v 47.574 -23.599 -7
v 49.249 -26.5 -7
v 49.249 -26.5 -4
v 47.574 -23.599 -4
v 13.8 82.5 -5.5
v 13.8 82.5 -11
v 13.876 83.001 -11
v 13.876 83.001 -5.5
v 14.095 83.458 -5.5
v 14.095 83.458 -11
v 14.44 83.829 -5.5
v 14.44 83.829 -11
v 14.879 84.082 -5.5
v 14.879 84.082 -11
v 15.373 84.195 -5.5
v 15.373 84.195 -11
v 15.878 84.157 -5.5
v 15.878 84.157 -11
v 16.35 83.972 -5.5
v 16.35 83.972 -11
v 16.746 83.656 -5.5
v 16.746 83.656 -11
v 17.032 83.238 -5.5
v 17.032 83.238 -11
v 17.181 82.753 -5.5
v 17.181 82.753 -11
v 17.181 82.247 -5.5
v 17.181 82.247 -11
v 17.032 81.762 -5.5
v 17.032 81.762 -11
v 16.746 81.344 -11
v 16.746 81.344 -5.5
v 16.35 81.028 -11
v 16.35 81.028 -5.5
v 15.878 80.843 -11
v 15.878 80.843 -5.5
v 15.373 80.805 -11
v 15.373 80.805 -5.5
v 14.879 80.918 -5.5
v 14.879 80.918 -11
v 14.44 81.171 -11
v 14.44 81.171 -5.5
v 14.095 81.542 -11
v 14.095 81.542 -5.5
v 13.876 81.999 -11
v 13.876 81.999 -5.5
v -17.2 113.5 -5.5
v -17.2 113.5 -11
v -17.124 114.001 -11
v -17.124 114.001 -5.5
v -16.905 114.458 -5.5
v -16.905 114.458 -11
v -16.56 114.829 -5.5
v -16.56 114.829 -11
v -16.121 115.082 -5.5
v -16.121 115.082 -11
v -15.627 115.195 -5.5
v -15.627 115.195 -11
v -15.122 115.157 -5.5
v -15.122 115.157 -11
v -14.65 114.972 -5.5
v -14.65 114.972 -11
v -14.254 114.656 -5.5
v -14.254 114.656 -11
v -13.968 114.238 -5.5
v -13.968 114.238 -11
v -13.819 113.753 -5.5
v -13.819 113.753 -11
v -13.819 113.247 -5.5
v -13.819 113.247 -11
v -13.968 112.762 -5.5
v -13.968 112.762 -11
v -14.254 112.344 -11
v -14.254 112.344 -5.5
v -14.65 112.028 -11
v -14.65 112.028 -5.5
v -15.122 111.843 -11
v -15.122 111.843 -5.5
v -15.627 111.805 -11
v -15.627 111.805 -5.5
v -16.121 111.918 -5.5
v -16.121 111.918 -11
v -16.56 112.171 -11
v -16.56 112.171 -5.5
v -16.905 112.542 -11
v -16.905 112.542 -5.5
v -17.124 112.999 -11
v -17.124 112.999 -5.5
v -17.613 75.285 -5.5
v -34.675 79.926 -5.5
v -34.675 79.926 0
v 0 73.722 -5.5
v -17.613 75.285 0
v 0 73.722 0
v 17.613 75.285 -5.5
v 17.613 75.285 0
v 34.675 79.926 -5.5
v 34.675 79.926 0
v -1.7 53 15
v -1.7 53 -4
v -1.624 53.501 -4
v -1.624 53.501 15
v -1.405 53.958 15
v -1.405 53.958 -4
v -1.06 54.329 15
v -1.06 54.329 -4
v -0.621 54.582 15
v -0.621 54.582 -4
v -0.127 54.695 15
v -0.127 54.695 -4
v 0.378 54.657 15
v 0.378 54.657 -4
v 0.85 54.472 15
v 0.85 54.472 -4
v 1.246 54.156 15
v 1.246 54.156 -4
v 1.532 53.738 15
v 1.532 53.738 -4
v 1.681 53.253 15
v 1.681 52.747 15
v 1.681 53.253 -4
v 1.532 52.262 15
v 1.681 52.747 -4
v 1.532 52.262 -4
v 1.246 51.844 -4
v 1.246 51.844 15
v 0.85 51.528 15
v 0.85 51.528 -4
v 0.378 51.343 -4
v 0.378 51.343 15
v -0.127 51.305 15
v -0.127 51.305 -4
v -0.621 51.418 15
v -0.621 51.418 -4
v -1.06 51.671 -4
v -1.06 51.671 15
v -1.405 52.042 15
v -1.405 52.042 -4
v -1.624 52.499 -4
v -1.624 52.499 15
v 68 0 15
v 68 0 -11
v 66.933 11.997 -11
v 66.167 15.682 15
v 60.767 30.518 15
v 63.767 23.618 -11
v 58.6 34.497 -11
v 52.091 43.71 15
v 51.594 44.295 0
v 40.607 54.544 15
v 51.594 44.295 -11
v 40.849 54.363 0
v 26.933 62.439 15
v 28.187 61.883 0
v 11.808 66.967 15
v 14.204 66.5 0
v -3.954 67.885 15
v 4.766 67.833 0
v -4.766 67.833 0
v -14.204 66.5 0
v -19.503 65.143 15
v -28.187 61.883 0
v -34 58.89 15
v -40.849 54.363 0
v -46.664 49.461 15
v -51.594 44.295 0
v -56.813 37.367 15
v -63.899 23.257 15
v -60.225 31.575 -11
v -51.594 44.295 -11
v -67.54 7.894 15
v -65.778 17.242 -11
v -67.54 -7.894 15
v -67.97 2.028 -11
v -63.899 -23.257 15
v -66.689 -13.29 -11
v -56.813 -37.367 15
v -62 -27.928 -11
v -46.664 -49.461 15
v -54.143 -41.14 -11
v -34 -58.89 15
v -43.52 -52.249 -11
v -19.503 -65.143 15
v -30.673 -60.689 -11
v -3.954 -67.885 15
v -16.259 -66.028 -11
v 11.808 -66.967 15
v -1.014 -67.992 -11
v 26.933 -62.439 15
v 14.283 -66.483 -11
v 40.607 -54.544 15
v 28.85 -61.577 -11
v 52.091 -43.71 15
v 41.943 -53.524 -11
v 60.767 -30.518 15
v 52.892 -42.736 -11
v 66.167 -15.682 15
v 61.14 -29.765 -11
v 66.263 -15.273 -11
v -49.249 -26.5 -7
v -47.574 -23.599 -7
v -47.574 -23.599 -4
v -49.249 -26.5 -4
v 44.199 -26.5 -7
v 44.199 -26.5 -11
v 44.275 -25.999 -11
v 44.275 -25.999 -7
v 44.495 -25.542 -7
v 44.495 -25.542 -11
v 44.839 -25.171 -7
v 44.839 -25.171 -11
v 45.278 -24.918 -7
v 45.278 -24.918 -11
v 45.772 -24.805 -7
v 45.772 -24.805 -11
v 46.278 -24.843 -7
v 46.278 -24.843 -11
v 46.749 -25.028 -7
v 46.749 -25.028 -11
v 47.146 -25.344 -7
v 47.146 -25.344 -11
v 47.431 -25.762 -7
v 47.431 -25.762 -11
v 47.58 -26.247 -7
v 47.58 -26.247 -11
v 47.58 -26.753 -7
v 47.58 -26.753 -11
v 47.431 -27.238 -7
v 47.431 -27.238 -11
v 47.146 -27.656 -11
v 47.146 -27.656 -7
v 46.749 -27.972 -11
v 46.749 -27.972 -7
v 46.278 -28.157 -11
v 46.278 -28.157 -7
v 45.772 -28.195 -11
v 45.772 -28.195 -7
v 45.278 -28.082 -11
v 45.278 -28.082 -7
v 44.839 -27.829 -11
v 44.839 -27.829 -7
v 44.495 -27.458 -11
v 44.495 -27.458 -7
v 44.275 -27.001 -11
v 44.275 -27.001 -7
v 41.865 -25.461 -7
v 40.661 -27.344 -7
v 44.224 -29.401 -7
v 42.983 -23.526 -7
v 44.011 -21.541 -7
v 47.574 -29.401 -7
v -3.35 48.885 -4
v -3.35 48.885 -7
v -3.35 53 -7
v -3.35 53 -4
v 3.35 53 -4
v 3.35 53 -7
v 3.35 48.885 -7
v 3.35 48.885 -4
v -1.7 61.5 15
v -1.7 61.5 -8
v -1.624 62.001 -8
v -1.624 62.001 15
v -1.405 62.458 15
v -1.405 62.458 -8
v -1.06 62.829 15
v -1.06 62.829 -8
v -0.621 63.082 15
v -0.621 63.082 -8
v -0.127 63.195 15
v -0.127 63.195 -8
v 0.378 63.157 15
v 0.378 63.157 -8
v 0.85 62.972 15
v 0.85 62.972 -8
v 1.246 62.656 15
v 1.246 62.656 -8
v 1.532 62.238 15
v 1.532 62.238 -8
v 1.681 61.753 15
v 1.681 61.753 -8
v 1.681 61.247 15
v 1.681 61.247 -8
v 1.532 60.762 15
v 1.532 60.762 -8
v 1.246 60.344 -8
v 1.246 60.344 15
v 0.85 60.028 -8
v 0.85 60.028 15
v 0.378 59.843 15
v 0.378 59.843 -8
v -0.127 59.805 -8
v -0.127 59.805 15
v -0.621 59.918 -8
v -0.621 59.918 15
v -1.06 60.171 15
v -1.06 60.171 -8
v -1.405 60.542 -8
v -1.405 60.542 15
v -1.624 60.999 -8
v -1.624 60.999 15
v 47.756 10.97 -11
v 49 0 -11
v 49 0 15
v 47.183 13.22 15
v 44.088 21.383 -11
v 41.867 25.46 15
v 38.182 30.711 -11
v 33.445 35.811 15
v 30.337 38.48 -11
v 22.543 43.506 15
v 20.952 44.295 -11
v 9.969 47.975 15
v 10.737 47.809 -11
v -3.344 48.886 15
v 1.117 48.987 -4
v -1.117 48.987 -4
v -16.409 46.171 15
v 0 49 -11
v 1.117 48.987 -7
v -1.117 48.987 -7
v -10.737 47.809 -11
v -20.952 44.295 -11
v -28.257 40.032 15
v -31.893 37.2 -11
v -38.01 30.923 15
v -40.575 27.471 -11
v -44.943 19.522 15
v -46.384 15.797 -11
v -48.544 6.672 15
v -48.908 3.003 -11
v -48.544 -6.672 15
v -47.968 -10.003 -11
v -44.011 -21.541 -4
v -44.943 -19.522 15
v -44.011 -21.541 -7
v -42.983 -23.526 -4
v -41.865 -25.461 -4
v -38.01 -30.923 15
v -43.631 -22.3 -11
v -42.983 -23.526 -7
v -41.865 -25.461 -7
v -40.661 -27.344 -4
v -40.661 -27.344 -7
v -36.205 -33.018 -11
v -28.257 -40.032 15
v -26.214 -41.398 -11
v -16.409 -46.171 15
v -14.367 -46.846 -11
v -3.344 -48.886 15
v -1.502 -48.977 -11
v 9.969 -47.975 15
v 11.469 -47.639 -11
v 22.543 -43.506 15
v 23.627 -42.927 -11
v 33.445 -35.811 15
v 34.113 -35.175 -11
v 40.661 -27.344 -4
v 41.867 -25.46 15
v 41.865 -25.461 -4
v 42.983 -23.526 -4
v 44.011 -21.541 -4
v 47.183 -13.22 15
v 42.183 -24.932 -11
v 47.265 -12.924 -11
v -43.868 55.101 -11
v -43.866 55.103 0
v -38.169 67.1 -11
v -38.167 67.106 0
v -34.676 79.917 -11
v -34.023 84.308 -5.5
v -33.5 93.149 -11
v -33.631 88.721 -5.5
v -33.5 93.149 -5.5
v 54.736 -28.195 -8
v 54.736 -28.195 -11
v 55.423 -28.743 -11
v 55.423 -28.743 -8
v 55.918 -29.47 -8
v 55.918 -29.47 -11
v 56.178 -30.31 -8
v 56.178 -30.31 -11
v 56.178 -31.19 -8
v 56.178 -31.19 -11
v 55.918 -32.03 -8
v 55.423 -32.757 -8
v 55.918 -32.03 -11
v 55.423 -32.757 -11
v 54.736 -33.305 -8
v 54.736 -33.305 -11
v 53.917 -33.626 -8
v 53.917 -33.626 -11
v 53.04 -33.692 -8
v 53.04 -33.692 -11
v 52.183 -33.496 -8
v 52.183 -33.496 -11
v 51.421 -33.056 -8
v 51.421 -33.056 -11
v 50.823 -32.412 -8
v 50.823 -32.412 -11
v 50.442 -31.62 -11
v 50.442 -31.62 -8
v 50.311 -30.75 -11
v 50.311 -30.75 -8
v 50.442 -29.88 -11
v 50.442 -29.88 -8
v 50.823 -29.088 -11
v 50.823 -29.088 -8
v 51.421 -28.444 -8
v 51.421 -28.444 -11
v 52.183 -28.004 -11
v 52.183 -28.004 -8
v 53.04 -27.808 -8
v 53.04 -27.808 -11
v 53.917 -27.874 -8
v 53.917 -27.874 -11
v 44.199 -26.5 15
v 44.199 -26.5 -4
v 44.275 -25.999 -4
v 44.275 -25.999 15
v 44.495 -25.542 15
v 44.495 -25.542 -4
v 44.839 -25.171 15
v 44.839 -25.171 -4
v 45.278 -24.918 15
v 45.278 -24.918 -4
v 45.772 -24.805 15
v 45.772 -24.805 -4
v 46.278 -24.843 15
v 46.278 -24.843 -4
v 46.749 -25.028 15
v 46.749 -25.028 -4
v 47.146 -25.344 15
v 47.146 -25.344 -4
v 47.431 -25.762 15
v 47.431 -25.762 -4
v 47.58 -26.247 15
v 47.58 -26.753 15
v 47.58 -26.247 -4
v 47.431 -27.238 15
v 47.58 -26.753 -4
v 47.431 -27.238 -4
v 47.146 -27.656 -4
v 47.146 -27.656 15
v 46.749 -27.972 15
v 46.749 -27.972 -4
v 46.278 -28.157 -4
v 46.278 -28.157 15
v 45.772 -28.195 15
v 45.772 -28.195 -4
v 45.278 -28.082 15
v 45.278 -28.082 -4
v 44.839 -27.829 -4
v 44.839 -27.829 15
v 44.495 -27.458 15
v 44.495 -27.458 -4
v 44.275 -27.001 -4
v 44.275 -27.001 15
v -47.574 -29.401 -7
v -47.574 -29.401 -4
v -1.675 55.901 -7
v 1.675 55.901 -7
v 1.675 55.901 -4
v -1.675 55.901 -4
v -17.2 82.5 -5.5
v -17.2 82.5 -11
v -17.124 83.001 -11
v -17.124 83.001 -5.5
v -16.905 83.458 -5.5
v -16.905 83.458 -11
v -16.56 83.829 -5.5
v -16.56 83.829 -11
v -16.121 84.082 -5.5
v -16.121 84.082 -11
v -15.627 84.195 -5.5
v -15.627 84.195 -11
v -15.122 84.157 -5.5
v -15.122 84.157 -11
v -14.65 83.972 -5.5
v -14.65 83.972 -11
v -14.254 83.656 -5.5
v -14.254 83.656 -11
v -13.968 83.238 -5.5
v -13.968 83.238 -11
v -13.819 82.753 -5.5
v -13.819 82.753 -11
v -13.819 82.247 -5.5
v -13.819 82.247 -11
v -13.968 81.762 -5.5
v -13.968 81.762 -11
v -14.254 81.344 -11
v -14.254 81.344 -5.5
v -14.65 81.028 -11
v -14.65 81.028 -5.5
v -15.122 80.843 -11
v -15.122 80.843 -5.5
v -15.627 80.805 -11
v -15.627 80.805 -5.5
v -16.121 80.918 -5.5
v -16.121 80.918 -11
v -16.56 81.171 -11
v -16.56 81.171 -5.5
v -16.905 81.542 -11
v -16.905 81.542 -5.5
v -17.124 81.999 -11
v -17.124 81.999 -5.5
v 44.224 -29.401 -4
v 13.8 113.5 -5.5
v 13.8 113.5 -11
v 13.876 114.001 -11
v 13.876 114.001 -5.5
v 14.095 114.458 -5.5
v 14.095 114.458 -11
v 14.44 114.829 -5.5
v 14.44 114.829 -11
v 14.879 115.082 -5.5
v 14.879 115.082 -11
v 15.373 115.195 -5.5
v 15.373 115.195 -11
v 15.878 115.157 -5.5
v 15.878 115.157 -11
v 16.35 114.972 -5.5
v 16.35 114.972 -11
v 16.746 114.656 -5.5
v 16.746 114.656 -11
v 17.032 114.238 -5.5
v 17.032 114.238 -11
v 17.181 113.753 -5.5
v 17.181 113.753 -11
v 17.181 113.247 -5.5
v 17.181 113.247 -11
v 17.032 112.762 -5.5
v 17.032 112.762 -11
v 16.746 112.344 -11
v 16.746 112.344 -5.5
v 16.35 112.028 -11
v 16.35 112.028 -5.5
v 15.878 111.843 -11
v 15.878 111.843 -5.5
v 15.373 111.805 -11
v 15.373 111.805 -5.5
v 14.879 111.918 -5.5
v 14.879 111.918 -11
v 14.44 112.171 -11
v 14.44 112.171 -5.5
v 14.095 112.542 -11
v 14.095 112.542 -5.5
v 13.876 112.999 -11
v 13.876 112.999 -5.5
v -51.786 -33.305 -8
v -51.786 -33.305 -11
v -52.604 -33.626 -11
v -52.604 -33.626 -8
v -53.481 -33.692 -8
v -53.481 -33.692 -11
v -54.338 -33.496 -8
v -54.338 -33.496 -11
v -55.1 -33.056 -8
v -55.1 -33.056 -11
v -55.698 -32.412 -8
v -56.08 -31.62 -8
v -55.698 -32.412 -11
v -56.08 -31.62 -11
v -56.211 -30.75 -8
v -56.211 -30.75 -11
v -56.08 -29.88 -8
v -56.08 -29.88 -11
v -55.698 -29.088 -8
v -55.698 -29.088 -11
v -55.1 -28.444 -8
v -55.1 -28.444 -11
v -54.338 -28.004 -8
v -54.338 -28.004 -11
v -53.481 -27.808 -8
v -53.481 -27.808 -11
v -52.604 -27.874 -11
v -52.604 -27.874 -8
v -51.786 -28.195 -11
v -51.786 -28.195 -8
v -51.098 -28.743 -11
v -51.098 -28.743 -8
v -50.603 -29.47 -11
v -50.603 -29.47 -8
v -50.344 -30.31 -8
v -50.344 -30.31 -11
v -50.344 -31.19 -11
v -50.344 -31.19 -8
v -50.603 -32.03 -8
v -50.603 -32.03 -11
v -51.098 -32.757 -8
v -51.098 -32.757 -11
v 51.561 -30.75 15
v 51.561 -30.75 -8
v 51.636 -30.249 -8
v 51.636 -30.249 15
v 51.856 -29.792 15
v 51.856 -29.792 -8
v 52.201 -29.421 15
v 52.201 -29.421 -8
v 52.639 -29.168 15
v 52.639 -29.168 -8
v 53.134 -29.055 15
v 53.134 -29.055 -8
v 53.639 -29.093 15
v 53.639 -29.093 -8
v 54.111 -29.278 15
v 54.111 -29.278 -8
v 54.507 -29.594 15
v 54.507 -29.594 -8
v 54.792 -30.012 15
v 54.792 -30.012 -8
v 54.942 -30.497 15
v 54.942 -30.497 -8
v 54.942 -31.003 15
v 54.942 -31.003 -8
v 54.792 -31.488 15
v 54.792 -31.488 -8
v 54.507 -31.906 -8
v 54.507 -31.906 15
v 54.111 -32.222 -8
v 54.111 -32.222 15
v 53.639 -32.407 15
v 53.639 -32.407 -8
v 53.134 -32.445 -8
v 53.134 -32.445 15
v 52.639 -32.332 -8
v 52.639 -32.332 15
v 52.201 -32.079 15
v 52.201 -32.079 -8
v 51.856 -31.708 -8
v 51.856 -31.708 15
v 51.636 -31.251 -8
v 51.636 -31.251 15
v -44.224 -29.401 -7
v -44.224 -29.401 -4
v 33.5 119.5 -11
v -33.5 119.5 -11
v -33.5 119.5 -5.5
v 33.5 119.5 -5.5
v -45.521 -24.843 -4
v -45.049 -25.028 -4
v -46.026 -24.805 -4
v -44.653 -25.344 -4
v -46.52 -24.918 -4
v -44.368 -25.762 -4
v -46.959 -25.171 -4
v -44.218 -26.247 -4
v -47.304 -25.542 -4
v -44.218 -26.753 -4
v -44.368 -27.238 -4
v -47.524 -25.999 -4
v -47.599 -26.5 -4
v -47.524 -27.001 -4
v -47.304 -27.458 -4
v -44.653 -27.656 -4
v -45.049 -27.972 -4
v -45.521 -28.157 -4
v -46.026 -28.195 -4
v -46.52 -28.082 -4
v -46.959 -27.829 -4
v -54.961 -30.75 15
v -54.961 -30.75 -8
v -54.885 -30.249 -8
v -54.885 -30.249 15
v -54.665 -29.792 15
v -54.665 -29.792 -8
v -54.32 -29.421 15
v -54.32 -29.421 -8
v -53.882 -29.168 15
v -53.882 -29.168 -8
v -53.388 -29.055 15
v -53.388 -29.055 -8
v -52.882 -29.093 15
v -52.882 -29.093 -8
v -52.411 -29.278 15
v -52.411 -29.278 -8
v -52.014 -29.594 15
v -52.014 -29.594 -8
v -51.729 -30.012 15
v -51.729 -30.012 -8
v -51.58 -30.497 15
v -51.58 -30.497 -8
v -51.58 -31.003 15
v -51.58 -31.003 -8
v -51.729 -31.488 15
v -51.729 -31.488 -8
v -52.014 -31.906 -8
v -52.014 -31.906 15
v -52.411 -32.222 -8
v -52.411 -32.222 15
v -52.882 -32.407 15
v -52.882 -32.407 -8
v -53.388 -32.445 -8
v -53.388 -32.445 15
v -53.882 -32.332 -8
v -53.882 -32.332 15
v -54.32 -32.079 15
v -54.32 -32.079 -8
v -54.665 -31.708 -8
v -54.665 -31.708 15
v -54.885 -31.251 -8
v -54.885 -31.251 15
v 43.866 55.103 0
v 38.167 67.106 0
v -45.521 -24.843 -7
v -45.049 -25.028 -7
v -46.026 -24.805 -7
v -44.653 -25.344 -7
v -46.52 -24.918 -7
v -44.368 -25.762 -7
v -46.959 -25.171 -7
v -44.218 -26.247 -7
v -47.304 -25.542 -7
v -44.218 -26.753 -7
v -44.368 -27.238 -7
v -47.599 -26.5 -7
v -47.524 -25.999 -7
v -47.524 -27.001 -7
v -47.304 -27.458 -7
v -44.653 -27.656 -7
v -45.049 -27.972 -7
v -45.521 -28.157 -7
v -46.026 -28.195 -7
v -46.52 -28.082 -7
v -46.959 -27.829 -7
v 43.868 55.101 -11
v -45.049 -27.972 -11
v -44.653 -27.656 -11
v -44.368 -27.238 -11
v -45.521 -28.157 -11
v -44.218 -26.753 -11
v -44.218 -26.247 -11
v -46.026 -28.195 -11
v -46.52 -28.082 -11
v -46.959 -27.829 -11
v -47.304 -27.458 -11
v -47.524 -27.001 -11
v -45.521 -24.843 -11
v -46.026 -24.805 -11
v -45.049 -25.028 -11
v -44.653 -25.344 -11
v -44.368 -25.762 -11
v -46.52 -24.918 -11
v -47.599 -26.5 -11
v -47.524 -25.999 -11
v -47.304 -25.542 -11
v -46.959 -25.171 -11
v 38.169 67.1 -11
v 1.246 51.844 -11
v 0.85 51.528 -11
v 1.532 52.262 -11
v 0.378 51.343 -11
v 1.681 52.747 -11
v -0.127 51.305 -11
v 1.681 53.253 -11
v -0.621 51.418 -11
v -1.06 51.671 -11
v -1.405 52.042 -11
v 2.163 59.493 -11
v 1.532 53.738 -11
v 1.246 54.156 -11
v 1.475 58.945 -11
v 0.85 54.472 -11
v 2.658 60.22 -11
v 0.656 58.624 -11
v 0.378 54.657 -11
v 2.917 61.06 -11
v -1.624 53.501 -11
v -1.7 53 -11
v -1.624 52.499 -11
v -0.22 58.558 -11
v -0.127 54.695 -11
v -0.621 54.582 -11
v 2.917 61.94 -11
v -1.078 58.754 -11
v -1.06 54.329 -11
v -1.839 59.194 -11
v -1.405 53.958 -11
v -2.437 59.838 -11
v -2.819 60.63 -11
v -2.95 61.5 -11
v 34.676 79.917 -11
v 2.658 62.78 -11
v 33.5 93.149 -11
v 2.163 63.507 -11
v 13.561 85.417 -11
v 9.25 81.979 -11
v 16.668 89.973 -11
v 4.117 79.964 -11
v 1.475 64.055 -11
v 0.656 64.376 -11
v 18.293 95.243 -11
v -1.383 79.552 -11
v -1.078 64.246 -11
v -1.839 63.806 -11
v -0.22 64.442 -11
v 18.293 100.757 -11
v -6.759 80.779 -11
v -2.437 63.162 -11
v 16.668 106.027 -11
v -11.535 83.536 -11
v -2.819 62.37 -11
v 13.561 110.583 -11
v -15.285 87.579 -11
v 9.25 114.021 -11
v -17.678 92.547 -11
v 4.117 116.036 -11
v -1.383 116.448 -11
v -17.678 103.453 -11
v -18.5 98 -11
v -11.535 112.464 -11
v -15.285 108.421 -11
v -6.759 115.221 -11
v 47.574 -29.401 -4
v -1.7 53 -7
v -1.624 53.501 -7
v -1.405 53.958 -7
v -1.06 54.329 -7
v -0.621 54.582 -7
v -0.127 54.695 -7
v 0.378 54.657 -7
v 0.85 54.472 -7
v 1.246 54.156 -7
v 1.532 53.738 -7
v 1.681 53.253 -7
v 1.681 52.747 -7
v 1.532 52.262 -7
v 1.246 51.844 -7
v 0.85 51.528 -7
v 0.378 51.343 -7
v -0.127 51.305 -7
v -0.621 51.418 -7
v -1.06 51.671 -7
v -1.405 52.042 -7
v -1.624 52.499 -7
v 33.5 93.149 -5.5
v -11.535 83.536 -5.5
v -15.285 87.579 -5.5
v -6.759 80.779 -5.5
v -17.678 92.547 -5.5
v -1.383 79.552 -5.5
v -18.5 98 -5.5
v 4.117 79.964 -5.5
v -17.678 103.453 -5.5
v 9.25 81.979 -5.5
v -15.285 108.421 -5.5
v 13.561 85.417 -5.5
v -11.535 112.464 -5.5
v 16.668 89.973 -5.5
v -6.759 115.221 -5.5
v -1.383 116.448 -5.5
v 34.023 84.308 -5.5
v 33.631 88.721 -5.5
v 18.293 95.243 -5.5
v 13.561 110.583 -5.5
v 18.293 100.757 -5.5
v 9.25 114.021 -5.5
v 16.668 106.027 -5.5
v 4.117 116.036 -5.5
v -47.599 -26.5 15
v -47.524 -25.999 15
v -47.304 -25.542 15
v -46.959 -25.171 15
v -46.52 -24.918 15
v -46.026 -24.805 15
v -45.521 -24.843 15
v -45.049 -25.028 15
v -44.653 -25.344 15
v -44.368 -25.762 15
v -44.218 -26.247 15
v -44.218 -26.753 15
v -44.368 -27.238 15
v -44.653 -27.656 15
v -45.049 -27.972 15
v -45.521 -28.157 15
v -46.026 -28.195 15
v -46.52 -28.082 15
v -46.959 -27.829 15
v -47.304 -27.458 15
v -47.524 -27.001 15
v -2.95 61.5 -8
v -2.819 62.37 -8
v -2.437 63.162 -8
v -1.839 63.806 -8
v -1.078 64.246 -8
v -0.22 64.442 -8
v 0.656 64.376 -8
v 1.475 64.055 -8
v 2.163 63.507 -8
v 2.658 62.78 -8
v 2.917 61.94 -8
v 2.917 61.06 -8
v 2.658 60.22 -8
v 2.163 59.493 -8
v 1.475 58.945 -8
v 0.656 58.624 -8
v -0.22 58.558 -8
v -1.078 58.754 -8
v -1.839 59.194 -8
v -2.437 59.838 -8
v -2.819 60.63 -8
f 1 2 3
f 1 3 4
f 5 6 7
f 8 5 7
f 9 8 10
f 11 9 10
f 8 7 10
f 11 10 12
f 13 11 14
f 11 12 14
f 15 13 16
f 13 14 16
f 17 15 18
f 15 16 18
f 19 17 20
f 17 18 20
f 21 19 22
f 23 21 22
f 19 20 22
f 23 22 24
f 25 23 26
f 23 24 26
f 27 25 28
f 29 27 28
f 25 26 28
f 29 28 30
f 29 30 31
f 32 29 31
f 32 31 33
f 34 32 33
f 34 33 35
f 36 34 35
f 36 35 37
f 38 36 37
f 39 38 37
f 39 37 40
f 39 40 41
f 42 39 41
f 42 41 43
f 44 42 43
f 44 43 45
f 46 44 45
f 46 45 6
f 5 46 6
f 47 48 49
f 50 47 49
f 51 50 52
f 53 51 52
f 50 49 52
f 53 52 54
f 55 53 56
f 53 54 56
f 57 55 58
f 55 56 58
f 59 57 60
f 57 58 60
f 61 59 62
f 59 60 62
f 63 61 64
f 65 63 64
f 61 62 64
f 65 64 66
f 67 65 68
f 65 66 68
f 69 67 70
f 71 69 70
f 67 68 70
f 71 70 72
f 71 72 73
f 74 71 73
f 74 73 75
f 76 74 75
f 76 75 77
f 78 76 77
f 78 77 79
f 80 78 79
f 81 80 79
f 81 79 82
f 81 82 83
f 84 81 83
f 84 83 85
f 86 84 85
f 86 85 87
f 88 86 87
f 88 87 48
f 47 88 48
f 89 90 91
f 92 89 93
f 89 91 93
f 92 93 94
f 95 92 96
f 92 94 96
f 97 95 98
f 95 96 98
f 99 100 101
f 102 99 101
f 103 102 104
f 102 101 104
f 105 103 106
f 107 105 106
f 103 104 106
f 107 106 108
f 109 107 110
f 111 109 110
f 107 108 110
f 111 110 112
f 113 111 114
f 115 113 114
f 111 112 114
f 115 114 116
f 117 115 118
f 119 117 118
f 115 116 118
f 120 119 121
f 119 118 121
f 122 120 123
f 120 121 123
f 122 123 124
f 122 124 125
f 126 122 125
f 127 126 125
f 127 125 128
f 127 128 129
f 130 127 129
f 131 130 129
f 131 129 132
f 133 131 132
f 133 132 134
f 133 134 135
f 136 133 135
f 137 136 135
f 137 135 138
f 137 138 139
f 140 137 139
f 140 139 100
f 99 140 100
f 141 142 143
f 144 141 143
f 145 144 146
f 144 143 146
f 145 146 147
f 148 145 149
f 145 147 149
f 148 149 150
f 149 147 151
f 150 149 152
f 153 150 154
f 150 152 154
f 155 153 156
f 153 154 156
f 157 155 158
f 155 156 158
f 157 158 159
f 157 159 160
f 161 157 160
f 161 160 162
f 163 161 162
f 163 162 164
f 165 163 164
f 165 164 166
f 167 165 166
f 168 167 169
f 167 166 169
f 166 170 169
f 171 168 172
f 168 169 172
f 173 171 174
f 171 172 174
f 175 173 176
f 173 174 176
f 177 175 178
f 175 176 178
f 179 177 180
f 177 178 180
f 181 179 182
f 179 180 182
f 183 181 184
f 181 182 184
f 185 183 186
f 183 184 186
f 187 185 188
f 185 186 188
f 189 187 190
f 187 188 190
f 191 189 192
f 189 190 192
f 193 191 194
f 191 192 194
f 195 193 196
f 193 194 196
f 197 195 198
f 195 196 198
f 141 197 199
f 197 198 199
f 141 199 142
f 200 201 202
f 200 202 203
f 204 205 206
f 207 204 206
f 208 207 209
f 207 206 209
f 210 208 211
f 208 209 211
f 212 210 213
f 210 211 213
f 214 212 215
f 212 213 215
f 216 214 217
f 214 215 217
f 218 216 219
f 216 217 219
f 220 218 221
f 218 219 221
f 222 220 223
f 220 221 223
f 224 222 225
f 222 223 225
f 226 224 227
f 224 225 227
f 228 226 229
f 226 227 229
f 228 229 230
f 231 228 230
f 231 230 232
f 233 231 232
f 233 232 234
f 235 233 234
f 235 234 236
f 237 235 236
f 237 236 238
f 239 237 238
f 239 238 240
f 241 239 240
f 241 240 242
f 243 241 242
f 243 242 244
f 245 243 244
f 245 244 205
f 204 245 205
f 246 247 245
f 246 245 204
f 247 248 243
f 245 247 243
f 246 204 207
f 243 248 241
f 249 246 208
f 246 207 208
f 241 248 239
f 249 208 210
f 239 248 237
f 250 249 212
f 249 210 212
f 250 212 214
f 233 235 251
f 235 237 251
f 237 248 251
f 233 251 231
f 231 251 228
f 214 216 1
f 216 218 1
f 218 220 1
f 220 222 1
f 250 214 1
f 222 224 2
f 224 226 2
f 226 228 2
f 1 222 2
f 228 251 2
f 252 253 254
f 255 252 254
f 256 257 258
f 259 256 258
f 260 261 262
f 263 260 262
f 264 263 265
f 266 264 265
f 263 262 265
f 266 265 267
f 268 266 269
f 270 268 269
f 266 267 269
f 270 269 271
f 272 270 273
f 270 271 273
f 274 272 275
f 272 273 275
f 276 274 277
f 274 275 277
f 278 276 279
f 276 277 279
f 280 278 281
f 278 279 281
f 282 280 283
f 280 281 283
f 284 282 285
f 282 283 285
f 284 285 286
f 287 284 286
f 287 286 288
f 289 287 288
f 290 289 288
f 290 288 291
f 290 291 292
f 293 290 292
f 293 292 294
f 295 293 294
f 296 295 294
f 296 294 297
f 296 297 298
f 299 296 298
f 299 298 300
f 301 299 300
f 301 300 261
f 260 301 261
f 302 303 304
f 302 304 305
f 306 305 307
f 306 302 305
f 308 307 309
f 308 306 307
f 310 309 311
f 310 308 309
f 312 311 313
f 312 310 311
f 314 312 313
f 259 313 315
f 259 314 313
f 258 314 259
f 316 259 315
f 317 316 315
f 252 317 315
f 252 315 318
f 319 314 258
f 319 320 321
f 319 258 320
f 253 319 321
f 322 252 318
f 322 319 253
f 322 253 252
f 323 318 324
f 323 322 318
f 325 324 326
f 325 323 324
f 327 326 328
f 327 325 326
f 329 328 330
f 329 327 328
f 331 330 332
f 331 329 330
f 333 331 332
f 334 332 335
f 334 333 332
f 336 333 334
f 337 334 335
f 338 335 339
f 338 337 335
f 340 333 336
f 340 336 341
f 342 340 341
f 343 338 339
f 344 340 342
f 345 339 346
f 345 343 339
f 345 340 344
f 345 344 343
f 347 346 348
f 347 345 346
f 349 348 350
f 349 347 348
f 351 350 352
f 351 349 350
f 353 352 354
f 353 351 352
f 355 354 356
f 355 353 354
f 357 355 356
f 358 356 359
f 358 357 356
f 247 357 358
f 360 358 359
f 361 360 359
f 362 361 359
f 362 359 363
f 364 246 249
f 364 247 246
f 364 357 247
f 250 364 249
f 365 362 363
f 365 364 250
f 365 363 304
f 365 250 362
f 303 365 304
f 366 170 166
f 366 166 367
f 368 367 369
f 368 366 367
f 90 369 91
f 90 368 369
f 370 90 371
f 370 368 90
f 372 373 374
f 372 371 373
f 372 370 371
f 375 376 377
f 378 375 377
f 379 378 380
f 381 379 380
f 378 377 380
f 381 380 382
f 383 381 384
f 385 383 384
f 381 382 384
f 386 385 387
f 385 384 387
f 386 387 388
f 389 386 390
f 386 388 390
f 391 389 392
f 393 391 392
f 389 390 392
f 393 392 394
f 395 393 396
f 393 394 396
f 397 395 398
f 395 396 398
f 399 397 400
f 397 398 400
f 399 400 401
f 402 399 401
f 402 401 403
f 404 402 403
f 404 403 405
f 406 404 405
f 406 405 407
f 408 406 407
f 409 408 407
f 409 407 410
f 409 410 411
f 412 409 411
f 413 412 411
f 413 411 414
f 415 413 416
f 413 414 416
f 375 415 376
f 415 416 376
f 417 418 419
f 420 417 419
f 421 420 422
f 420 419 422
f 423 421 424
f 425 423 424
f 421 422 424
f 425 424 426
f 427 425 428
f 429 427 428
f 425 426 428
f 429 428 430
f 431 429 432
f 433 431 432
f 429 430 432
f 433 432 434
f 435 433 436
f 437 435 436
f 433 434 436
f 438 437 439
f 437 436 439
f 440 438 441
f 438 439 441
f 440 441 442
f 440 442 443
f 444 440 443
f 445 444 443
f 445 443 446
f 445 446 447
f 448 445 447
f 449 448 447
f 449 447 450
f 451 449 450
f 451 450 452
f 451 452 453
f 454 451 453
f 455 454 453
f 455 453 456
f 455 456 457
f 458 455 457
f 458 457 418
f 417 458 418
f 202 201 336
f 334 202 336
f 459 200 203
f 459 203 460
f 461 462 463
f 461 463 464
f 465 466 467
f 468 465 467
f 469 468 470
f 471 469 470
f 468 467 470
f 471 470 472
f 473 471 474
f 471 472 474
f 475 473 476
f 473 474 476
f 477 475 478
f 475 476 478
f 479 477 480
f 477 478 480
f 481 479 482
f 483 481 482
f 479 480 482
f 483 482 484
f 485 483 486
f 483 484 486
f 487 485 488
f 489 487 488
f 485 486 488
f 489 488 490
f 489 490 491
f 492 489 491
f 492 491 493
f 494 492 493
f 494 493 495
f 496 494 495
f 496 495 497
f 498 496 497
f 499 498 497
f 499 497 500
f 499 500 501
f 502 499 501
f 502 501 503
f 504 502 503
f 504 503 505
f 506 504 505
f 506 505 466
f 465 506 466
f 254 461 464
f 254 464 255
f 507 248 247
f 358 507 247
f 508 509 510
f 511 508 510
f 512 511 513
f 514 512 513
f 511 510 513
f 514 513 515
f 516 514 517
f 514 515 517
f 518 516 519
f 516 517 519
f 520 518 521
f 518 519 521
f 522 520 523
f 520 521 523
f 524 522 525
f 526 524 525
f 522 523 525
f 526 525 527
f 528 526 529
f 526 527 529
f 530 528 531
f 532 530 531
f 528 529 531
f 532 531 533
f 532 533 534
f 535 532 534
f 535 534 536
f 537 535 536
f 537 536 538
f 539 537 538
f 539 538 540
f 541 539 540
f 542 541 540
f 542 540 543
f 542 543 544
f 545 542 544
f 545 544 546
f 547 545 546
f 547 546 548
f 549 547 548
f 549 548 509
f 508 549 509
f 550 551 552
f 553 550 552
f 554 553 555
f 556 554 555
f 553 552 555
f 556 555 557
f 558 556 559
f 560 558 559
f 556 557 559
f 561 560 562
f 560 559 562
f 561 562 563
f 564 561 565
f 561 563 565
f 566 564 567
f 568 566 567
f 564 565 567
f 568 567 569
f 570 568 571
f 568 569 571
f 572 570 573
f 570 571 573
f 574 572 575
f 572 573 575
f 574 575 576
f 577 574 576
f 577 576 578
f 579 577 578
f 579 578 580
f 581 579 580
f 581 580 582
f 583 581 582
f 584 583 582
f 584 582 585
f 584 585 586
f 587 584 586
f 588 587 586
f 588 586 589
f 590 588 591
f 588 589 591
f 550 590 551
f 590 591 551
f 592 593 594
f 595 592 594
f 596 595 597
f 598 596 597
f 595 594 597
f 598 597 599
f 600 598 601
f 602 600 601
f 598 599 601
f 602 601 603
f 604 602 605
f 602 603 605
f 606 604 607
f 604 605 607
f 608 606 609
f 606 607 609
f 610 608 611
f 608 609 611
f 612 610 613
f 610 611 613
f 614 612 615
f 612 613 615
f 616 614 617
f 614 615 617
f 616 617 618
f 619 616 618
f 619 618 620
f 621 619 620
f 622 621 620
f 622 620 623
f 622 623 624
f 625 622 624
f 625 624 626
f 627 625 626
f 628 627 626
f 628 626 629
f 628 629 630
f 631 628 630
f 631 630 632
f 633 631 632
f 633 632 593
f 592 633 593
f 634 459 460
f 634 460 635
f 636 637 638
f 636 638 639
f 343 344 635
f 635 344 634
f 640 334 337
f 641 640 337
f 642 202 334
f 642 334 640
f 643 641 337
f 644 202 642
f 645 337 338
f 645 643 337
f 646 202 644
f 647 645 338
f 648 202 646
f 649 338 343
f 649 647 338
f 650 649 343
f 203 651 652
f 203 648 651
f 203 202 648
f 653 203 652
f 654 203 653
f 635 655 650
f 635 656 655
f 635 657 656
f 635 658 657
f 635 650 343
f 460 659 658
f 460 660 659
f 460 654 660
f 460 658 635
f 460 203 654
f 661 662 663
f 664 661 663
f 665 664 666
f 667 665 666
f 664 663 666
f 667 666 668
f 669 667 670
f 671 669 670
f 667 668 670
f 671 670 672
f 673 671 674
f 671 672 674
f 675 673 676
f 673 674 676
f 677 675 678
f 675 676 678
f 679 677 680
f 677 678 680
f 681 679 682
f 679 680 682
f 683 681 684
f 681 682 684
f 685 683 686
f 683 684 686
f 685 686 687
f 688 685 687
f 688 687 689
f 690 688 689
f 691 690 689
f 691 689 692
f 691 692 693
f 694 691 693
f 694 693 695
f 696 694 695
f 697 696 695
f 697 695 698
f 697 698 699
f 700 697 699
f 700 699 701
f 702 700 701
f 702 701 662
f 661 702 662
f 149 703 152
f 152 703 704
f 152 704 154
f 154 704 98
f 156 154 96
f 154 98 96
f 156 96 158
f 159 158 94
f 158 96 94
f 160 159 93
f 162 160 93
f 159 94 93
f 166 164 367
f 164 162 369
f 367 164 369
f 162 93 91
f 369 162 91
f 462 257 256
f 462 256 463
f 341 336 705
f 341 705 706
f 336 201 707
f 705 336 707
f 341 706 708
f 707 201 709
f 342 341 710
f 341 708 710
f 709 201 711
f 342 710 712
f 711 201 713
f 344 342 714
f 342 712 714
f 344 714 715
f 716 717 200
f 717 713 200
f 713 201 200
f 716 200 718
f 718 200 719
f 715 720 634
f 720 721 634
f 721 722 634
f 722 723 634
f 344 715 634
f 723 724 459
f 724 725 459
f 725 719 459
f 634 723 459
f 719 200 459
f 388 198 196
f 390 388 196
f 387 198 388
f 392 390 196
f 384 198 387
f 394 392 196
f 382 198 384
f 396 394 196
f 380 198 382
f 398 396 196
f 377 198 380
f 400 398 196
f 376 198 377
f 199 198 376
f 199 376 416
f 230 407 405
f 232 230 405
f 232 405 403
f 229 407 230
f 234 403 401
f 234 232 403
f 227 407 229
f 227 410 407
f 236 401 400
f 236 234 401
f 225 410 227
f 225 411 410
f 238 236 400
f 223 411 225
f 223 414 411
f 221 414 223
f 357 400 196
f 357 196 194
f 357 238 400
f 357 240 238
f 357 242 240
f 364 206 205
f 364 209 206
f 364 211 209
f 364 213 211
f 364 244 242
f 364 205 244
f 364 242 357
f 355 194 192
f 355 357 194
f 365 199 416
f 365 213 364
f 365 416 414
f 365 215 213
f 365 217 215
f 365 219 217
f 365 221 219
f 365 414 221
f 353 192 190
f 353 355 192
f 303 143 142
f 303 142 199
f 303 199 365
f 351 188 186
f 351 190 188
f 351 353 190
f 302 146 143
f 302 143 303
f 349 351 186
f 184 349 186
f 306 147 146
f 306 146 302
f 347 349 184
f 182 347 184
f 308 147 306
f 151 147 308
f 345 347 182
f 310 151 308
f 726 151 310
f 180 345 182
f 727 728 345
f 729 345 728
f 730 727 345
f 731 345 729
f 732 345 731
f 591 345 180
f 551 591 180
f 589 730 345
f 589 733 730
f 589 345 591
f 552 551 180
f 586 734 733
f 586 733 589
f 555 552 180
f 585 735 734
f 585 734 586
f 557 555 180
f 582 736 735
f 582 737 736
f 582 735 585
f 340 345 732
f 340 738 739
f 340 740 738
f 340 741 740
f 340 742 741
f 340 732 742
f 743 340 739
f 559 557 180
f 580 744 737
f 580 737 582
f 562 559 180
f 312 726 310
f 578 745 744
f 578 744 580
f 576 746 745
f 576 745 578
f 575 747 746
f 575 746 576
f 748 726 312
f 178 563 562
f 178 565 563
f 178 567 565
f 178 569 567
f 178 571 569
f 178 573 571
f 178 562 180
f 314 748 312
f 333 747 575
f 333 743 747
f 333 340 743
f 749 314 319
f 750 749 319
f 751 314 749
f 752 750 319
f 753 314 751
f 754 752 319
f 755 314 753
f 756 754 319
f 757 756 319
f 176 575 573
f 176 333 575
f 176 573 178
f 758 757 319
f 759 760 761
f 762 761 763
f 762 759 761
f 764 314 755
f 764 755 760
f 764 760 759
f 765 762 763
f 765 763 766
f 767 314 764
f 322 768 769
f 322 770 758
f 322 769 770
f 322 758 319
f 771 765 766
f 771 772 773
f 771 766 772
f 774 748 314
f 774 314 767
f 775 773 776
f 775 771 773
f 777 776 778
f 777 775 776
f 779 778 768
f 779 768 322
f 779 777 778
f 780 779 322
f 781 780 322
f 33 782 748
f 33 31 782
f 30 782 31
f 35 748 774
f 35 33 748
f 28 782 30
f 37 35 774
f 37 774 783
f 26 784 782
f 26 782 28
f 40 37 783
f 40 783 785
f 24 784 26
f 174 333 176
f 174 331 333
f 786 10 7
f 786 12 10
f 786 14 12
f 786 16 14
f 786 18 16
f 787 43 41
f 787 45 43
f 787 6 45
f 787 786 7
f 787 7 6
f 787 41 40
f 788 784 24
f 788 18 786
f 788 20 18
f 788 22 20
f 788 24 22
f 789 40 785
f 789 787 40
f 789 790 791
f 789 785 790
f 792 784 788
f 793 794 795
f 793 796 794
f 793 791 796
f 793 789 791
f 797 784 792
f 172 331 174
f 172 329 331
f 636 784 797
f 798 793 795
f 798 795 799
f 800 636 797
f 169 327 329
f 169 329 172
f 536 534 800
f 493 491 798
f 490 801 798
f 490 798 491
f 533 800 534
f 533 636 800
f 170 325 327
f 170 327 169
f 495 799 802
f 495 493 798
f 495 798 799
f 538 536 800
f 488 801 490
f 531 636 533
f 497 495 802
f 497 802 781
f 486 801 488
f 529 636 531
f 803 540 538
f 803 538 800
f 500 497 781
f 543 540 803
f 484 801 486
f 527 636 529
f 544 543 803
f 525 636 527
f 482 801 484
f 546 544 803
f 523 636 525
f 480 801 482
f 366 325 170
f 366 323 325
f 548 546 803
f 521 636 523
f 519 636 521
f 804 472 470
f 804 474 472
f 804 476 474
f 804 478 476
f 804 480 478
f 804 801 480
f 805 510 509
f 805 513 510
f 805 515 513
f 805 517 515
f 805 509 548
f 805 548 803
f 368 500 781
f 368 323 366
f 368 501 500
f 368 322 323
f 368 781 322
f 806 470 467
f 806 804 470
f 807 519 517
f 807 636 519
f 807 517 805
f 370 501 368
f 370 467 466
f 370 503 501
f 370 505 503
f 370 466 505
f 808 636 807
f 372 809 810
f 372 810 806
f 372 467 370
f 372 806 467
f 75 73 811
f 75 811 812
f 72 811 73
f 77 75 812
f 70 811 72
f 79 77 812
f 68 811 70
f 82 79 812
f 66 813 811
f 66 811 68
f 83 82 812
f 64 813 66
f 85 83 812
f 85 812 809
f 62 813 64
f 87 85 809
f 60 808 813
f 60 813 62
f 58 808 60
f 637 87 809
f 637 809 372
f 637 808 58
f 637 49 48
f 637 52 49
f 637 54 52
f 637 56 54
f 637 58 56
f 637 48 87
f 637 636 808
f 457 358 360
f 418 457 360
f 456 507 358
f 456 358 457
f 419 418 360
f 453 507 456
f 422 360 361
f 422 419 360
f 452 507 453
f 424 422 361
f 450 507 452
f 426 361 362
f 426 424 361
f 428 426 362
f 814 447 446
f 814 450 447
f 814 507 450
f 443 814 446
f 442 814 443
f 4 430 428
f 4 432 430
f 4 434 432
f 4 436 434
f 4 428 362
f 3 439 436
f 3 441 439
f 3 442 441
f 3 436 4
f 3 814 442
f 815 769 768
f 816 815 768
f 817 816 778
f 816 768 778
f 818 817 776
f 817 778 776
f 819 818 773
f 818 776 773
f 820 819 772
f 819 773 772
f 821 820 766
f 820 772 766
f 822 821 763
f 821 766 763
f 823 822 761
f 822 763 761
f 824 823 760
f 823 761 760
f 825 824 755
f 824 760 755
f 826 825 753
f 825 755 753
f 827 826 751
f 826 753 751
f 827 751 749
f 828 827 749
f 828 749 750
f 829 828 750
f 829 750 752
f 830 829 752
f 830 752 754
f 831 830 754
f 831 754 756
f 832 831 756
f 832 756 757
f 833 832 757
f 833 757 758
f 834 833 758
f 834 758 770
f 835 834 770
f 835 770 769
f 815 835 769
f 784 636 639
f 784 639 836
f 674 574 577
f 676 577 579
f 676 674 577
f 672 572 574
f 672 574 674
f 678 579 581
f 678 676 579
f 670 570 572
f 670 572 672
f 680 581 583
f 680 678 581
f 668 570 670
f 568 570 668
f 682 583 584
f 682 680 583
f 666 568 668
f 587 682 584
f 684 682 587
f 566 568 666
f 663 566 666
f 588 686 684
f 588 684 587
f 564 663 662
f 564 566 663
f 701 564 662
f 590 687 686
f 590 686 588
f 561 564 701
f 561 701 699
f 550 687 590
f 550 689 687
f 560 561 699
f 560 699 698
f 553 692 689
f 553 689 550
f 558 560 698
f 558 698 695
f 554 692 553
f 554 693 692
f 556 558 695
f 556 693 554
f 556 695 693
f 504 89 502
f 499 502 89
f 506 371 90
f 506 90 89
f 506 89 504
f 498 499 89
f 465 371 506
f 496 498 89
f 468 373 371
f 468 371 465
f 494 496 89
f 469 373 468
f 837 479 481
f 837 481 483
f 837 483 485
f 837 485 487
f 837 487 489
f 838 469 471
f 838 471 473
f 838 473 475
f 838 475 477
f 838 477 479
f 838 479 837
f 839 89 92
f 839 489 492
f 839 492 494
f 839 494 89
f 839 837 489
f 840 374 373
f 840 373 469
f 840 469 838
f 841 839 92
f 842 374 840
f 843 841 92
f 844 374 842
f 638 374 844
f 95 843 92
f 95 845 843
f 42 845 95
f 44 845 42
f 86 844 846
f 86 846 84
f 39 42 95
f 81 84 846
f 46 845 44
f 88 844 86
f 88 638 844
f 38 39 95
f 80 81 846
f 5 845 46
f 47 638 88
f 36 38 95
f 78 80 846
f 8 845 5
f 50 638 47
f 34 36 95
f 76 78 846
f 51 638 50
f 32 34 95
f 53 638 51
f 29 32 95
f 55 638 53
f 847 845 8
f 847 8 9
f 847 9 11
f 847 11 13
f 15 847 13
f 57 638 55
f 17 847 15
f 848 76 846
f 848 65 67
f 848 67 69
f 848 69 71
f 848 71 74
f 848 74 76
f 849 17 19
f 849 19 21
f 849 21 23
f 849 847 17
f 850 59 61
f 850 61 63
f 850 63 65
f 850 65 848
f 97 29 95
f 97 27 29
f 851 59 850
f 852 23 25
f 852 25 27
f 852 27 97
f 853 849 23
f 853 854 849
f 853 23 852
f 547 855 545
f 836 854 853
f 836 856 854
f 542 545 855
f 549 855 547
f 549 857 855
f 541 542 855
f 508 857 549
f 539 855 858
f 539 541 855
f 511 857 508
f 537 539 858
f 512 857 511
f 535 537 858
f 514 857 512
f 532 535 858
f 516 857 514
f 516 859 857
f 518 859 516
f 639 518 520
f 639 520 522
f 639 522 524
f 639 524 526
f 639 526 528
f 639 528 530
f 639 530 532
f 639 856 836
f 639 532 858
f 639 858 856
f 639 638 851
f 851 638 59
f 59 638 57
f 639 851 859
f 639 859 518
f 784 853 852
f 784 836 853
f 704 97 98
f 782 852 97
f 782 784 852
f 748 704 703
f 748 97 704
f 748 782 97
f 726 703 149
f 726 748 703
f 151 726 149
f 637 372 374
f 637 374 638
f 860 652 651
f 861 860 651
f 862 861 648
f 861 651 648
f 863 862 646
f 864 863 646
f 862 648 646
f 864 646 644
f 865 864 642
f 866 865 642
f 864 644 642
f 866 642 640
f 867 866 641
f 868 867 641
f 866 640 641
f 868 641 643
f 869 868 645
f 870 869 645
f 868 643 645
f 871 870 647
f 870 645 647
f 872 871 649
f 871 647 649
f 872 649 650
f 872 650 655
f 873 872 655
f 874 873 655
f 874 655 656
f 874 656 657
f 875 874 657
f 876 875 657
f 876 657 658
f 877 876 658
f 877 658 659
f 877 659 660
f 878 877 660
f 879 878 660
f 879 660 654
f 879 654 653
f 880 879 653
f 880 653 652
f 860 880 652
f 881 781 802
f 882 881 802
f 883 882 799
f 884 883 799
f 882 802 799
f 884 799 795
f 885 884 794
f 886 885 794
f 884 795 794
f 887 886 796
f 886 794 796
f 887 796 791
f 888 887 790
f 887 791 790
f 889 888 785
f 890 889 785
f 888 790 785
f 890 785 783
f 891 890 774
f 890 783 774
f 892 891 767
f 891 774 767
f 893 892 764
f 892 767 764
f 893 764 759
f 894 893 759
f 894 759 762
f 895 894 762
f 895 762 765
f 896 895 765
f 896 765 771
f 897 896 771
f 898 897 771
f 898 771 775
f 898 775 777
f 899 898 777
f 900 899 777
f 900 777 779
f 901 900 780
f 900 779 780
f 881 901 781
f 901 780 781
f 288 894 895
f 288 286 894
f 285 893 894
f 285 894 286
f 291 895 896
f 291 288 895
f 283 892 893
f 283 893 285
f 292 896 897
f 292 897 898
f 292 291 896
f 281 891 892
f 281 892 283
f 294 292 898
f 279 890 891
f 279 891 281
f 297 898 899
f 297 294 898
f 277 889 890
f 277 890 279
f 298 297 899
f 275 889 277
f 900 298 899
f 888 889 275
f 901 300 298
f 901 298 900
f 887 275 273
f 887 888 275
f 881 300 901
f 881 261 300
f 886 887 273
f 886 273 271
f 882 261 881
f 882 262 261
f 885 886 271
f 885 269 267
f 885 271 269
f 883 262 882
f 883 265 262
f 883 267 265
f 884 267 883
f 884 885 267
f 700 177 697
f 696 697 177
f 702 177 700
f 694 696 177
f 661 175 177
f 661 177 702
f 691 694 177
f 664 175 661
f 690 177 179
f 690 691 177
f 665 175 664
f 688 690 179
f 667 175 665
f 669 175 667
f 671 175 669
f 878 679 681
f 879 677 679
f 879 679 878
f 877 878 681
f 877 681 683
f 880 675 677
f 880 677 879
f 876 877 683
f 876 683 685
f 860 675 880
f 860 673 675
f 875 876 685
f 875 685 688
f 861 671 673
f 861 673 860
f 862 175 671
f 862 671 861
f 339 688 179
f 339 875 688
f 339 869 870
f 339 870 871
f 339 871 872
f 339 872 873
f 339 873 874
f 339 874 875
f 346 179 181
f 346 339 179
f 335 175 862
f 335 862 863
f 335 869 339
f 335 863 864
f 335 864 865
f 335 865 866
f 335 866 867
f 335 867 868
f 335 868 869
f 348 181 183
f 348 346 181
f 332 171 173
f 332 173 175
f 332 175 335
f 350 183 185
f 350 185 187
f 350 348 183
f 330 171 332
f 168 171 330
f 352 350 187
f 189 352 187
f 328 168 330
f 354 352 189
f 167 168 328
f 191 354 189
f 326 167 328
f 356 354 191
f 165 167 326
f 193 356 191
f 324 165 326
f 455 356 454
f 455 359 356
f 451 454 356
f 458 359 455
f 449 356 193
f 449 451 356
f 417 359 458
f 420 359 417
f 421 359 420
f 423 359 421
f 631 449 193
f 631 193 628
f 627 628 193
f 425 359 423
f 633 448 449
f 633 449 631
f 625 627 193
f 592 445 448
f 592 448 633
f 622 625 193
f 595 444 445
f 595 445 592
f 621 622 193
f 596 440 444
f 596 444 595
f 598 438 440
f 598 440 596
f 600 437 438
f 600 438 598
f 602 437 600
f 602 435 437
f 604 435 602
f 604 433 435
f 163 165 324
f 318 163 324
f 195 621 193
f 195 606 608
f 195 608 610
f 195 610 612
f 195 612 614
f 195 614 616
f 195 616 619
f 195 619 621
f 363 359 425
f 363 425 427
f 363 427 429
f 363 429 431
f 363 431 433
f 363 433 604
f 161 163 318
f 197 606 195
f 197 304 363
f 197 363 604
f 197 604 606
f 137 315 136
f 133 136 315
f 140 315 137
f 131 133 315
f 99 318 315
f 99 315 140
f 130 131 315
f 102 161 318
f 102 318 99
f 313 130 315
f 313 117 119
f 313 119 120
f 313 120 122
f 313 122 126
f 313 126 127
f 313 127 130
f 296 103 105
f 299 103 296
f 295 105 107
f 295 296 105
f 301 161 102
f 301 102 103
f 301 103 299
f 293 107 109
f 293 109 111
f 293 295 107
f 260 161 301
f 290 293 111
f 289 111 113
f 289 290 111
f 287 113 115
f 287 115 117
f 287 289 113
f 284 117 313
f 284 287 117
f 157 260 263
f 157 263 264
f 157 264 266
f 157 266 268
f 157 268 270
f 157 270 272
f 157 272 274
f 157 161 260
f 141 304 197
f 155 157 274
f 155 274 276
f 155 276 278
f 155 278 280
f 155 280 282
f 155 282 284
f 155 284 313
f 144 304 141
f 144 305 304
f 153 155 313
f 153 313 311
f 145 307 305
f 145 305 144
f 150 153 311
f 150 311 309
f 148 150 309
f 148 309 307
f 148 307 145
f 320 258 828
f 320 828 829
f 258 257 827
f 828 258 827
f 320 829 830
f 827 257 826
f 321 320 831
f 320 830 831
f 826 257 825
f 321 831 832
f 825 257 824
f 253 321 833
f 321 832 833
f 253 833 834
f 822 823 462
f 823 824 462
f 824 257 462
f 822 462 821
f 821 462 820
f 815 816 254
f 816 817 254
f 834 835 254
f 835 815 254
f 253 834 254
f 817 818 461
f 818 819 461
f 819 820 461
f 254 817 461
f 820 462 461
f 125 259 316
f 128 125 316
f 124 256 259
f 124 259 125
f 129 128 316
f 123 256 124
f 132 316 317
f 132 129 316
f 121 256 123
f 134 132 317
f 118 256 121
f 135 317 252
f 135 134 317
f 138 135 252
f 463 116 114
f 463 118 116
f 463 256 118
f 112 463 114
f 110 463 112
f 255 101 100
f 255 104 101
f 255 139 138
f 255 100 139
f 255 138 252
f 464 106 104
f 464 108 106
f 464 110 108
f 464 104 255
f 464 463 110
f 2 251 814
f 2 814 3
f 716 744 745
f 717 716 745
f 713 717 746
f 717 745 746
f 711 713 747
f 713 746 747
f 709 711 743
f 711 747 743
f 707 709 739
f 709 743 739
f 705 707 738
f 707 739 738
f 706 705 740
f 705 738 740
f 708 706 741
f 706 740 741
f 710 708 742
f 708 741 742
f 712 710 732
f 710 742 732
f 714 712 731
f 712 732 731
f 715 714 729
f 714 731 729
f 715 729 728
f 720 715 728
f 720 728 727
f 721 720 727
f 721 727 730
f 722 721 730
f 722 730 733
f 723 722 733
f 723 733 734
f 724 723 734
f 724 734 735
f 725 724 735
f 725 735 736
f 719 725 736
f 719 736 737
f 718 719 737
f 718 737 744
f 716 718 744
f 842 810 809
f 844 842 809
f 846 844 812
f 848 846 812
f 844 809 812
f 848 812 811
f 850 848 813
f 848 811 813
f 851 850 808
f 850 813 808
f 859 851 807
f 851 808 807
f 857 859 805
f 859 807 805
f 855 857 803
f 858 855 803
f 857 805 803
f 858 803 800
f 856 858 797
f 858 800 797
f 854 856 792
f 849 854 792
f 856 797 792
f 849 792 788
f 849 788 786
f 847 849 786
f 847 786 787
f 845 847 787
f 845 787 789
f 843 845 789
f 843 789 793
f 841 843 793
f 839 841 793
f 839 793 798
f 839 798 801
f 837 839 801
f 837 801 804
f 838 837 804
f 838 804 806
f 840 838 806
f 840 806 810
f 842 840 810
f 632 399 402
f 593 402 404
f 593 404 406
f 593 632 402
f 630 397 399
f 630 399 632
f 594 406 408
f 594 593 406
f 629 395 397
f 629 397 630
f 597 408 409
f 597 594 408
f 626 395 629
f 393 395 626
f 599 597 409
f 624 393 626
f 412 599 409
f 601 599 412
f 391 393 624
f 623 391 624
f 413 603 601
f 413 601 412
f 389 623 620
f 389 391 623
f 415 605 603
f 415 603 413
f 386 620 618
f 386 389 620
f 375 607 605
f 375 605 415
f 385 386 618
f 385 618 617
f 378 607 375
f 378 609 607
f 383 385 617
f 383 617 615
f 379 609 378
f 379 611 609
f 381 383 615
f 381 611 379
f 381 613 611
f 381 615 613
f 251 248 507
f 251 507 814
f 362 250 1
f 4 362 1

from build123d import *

# Parameters (mm, degrees)
BOSS_EXTRUDE1_DEPTH      = 15
BOSS_EXTRUDE1_DEPTH_BACK = 11
SKETCH1_R                = 68
SKETCH1_R_2              = 49
SKETCH2_W                = 43
SKETCH2_H                = 43
SKETCH2_R                = 18.5
BOSS_EXTRUDE2_DEPTH      = 11
SKETCH3_R                = 1.7
CUT_EXTRUDE1_DEPTH       = 140.929446508
SKETCH4_R                = 100
CUT_EXTRUDE2_DEPTH       = 5.5
SKETCH5_R                = 1.7
CUT_EXTRUDE3_DEPTH       = 140.929446508
SKETCH6_R                = 2.95
CUT_EXTRUDE4_DEPTH       = 3
CIRPATTERN1_COUNT        = 3
CUT_EXTRUDE5_DEPTH       = 3
CIRPATTERN2_COUNT        = 3


with BuildPart() as part:
    # Sketch1 → Boss-Extrude1 (new, two sides: drawn at the far end of the back side and taken through both)
    with BuildSketch(Plane.XY.offset(-BOSS_EXTRUDE1_DEPTH_BACK)):
        Circle(SKETCH1_R)
        Circle(SKETCH1_R_2, mode=Mode.SUBTRACT)
    extrude(amount=BOSS_EXTRUDE1_DEPTH + BOSS_EXTRUDE1_DEPTH_BACK)

    # Sketch2 → Boss-Extrude2 (add)
    # profile 1 of 6: a face of its own
    with BuildSketch(Plane(origin=(0, 0, -11), x_dir=(-1, 0, 0), z_dir=(0, 0, -1))):
        with BuildLine():
            Line((-33.5, 66.5), (-33.5, 93.149074069))
            ThreePointArc((-33.5, 93.149074069), (-38.168927278, 67.100269686), (-51.594405594, 44.294664592))
            ThreePointArc((-51.594405594, 44.294664592), (-34.722076366, 58.466891596), (-14.203872711, 66.5))
            Line((-14.203872711, 66.5), (-33.5, 66.5))
        make_face()
    # profile 2 of 6: a face of its own
    with BuildSketch(Plane(origin=(0, 0, -11), x_dir=(-1, 0, 0), z_dir=(0, 0, -1))):
        with BuildLine():
            ThreePointArc((-14.203872711, 66.5), (-34.722076366, 58.466891596), (-51.594405594, 44.294664592))
            Line((-51.594405594, 44.294664592), (-20.951913723, 44.294664592))
            ThreePointArc((-20.951913723, 44.294664592), (0, 49), (20.951913723, 44.294664592))
            Line((20.951913723, 44.294664592), (51.594405594, 44.294664592))
            ThreePointArc((51.594405594, 44.294664592), (34.722076366, 58.466891596), (14.203872711, 66.5))
            Line((14.203872711, 66.5), (-14.203872711, 66.5))
        make_face()
    # profile 3 of 6: a face of its own
    with BuildSketch(Plane(origin=(0, 0, -11), x_dir=(-1, 0, 0), z_dir=(0, 0, -1))):
        with BuildLine():
            ThreePointArc((51.594405594, 44.294664592), (38.168927278, 67.100269686), (33.5, 93.149074069))
            Line((33.5, 93.149074069), (33.5, 66.5))
            Line((33.5, 66.5), (14.203872711, 66.5))
            ThreePointArc((14.203872711, 66.5), (34.722076366, 58.466891596), (51.594405594, 44.294664592))
        make_face()
    # profile 4 of 6: a face of its own
    with BuildSketch(Plane(origin=(0, 0, -11), x_dir=(-1, 0, 0), z_dir=(0, 0, -1))):
        with BuildLine():
            ThreePointArc((14.203872711, 66.5), (0, 68), (-14.203872711, 66.5))
            Line((-14.203872711, 66.5), (14.203872711, 66.5))
        make_face()
    # profile 5 of 6: a face of its own
    with BuildSketch(Plane(origin=(0, 0, -11), x_dir=(-1, 0, 0), z_dir=(0, 0, -1))):
        with BuildLine():
            Line((-21.5, 76.5), (-21.5, 119.5))
            Line((-21.5, 119.5), (-33.5, 119.5))
            Line((-33.5, 119.5), (-33.5, 93.149074069))
            Line((-33.5, 93.149074069), (-33.5, 66.5))
            Line((-33.5, 66.5), (-14.203872711, 66.5))
            ThreePointArc((-14.203872711, 66.5), (0, 68), (14.203872711, 66.5))
            Line((14.203872711, 66.5), (33.5, 66.5))
            Line((33.5, 66.5), (33.5, 93.149074069))
            Line((33.5, 93.149074069), (33.5, 119.5))
            Line((33.5, 119.5), (21.5, 119.5))
            Line((21.5, 119.5), (21.5, 76.5))
            Line((21.5, 76.5), (-21.5, 76.5))
        make_face()
    # profile 6 of 6: a face of its own
    with BuildSketch(Plane(origin=(0, 0, -11), x_dir=(-1, 0, 0), z_dir=(0, 0, -1))):
        with Locations((0, 98)):
            Rectangle(SKETCH2_W, SKETCH2_H)
        with Locations((0, 98)):
            Circle(SKETCH2_R, mode=Mode.SUBTRACT)
    extrude(amount=-BOSS_EXTRUDE2_DEPTH)

    # Sketch3 → Cut-Extrude1 (cut, through all)
    with BuildSketch(Plane(origin=(0, 0, -11), x_dir=(-1, 0, 0), z_dir=(0, 0, -1))):
        with Locations((-15.5, 113.5)):
            Circle(SKETCH3_R)
        with Locations((15.5, 113.5)):
            Circle(SKETCH3_R)
        with Locations((15.5, 82.5)):
            Circle(SKETCH3_R)
        with Locations((-15.5, 82.5)):
            Circle(SKETCH3_R)
    extrude(amount=-CUT_EXTRUDE1_DEPTH, mode=Mode.SUBTRACT)

    # Sketch4 → Cut-Extrude2 (cut)
    with BuildSketch(Plane.XY):
        with Locations((0, 173.721812761)):
            Circle(SKETCH4_R)
    extrude(amount=-CUT_EXTRUDE2_DEPTH, mode=Mode.SUBTRACT)

    # Sketch5 → Cut-Extrude3 (cut, through all)
    with BuildSketch(Plane(origin=(0, 0, -11), x_dir=(-1, 0, 0), z_dir=(0, 0, -1))):
        with Locations((0, 61.5)):
            Circle(SKETCH5_R)
        with Locations((53.260562333, -30.75)):
            Circle(SKETCH5_R)
        with Locations((-53.260562333, -30.75)):
            Circle(SKETCH5_R)
        with Locations((0, 53)):
            Circle(SKETCH5_R)
        with Locations((45.899346401, -26.5)):
            Circle(SKETCH5_R)
        with Locations((-45.899346401, -26.5)):
            Circle(SKETCH5_R)
    extrude(amount=-CUT_EXTRUDE3_DEPTH, mode=Mode.SUBTRACT)

    # Sketch6 → Cut-Extrude4 (cut)
    with BuildSketch(Plane(origin=(0, 0, -11), x_dir=(-1, 0, 0), z_dir=(0, 0, -1))):
        with Locations((0, 61.5)):
            Circle(SKETCH6_R)
    cut_extrude4 = extrude(amount=-CUT_EXTRUDE4_DEPTH, mode=Mode.SUBTRACT)

    # CirPattern1: Cut-Extrude4 ×3 about axis
    cirpattern1_axis = Axis((0, 0, 0), (0, 0, 1))
    for i in range(1, CIRPATTERN1_COUNT):
        add(cut_extrude4.rotate(cirpattern1_axis, i * 360 / CIRPATTERN1_COUNT), mode=Mode.SUBTRACT)

    # Sketch7 → Cut-Extrude5 (cut)
    with BuildSketch(Plane(origin=(0, 0, -7), x_dir=(-1, 0, 0), z_dir=(0, 0, -1))):
        Polygon((-3.35, 44), (3.35, 44), (3.35, 53), (1.675, 50.098814897), (-1.675, 50.098814897), (-3.35, 53), align=None)
        Polygon((1.675, 50.098814897), (-1.675, 50.098814897), (-3.35, 53), (-1.675, 55.901185103), (1.675, 55.901185103), (3.35, 53), align=None)
    cut_extrude5 = extrude(amount=-CUT_EXTRUDE5_DEPTH, mode=Mode.SUBTRACT)

    # CirPattern2: Cut-Extrude5 ×3 about axis
    cirpattern2_axis = Axis((0, 0, 0), (0, 0, 1))
    for i in range(1, CIRPATTERN2_COUNT):
        add(cut_extrude5.rotate(cirpattern2_axis, i * 360 / CIRPATTERN2_COUNT), mode=Mode.SUBTRACT)


solid = part.part
